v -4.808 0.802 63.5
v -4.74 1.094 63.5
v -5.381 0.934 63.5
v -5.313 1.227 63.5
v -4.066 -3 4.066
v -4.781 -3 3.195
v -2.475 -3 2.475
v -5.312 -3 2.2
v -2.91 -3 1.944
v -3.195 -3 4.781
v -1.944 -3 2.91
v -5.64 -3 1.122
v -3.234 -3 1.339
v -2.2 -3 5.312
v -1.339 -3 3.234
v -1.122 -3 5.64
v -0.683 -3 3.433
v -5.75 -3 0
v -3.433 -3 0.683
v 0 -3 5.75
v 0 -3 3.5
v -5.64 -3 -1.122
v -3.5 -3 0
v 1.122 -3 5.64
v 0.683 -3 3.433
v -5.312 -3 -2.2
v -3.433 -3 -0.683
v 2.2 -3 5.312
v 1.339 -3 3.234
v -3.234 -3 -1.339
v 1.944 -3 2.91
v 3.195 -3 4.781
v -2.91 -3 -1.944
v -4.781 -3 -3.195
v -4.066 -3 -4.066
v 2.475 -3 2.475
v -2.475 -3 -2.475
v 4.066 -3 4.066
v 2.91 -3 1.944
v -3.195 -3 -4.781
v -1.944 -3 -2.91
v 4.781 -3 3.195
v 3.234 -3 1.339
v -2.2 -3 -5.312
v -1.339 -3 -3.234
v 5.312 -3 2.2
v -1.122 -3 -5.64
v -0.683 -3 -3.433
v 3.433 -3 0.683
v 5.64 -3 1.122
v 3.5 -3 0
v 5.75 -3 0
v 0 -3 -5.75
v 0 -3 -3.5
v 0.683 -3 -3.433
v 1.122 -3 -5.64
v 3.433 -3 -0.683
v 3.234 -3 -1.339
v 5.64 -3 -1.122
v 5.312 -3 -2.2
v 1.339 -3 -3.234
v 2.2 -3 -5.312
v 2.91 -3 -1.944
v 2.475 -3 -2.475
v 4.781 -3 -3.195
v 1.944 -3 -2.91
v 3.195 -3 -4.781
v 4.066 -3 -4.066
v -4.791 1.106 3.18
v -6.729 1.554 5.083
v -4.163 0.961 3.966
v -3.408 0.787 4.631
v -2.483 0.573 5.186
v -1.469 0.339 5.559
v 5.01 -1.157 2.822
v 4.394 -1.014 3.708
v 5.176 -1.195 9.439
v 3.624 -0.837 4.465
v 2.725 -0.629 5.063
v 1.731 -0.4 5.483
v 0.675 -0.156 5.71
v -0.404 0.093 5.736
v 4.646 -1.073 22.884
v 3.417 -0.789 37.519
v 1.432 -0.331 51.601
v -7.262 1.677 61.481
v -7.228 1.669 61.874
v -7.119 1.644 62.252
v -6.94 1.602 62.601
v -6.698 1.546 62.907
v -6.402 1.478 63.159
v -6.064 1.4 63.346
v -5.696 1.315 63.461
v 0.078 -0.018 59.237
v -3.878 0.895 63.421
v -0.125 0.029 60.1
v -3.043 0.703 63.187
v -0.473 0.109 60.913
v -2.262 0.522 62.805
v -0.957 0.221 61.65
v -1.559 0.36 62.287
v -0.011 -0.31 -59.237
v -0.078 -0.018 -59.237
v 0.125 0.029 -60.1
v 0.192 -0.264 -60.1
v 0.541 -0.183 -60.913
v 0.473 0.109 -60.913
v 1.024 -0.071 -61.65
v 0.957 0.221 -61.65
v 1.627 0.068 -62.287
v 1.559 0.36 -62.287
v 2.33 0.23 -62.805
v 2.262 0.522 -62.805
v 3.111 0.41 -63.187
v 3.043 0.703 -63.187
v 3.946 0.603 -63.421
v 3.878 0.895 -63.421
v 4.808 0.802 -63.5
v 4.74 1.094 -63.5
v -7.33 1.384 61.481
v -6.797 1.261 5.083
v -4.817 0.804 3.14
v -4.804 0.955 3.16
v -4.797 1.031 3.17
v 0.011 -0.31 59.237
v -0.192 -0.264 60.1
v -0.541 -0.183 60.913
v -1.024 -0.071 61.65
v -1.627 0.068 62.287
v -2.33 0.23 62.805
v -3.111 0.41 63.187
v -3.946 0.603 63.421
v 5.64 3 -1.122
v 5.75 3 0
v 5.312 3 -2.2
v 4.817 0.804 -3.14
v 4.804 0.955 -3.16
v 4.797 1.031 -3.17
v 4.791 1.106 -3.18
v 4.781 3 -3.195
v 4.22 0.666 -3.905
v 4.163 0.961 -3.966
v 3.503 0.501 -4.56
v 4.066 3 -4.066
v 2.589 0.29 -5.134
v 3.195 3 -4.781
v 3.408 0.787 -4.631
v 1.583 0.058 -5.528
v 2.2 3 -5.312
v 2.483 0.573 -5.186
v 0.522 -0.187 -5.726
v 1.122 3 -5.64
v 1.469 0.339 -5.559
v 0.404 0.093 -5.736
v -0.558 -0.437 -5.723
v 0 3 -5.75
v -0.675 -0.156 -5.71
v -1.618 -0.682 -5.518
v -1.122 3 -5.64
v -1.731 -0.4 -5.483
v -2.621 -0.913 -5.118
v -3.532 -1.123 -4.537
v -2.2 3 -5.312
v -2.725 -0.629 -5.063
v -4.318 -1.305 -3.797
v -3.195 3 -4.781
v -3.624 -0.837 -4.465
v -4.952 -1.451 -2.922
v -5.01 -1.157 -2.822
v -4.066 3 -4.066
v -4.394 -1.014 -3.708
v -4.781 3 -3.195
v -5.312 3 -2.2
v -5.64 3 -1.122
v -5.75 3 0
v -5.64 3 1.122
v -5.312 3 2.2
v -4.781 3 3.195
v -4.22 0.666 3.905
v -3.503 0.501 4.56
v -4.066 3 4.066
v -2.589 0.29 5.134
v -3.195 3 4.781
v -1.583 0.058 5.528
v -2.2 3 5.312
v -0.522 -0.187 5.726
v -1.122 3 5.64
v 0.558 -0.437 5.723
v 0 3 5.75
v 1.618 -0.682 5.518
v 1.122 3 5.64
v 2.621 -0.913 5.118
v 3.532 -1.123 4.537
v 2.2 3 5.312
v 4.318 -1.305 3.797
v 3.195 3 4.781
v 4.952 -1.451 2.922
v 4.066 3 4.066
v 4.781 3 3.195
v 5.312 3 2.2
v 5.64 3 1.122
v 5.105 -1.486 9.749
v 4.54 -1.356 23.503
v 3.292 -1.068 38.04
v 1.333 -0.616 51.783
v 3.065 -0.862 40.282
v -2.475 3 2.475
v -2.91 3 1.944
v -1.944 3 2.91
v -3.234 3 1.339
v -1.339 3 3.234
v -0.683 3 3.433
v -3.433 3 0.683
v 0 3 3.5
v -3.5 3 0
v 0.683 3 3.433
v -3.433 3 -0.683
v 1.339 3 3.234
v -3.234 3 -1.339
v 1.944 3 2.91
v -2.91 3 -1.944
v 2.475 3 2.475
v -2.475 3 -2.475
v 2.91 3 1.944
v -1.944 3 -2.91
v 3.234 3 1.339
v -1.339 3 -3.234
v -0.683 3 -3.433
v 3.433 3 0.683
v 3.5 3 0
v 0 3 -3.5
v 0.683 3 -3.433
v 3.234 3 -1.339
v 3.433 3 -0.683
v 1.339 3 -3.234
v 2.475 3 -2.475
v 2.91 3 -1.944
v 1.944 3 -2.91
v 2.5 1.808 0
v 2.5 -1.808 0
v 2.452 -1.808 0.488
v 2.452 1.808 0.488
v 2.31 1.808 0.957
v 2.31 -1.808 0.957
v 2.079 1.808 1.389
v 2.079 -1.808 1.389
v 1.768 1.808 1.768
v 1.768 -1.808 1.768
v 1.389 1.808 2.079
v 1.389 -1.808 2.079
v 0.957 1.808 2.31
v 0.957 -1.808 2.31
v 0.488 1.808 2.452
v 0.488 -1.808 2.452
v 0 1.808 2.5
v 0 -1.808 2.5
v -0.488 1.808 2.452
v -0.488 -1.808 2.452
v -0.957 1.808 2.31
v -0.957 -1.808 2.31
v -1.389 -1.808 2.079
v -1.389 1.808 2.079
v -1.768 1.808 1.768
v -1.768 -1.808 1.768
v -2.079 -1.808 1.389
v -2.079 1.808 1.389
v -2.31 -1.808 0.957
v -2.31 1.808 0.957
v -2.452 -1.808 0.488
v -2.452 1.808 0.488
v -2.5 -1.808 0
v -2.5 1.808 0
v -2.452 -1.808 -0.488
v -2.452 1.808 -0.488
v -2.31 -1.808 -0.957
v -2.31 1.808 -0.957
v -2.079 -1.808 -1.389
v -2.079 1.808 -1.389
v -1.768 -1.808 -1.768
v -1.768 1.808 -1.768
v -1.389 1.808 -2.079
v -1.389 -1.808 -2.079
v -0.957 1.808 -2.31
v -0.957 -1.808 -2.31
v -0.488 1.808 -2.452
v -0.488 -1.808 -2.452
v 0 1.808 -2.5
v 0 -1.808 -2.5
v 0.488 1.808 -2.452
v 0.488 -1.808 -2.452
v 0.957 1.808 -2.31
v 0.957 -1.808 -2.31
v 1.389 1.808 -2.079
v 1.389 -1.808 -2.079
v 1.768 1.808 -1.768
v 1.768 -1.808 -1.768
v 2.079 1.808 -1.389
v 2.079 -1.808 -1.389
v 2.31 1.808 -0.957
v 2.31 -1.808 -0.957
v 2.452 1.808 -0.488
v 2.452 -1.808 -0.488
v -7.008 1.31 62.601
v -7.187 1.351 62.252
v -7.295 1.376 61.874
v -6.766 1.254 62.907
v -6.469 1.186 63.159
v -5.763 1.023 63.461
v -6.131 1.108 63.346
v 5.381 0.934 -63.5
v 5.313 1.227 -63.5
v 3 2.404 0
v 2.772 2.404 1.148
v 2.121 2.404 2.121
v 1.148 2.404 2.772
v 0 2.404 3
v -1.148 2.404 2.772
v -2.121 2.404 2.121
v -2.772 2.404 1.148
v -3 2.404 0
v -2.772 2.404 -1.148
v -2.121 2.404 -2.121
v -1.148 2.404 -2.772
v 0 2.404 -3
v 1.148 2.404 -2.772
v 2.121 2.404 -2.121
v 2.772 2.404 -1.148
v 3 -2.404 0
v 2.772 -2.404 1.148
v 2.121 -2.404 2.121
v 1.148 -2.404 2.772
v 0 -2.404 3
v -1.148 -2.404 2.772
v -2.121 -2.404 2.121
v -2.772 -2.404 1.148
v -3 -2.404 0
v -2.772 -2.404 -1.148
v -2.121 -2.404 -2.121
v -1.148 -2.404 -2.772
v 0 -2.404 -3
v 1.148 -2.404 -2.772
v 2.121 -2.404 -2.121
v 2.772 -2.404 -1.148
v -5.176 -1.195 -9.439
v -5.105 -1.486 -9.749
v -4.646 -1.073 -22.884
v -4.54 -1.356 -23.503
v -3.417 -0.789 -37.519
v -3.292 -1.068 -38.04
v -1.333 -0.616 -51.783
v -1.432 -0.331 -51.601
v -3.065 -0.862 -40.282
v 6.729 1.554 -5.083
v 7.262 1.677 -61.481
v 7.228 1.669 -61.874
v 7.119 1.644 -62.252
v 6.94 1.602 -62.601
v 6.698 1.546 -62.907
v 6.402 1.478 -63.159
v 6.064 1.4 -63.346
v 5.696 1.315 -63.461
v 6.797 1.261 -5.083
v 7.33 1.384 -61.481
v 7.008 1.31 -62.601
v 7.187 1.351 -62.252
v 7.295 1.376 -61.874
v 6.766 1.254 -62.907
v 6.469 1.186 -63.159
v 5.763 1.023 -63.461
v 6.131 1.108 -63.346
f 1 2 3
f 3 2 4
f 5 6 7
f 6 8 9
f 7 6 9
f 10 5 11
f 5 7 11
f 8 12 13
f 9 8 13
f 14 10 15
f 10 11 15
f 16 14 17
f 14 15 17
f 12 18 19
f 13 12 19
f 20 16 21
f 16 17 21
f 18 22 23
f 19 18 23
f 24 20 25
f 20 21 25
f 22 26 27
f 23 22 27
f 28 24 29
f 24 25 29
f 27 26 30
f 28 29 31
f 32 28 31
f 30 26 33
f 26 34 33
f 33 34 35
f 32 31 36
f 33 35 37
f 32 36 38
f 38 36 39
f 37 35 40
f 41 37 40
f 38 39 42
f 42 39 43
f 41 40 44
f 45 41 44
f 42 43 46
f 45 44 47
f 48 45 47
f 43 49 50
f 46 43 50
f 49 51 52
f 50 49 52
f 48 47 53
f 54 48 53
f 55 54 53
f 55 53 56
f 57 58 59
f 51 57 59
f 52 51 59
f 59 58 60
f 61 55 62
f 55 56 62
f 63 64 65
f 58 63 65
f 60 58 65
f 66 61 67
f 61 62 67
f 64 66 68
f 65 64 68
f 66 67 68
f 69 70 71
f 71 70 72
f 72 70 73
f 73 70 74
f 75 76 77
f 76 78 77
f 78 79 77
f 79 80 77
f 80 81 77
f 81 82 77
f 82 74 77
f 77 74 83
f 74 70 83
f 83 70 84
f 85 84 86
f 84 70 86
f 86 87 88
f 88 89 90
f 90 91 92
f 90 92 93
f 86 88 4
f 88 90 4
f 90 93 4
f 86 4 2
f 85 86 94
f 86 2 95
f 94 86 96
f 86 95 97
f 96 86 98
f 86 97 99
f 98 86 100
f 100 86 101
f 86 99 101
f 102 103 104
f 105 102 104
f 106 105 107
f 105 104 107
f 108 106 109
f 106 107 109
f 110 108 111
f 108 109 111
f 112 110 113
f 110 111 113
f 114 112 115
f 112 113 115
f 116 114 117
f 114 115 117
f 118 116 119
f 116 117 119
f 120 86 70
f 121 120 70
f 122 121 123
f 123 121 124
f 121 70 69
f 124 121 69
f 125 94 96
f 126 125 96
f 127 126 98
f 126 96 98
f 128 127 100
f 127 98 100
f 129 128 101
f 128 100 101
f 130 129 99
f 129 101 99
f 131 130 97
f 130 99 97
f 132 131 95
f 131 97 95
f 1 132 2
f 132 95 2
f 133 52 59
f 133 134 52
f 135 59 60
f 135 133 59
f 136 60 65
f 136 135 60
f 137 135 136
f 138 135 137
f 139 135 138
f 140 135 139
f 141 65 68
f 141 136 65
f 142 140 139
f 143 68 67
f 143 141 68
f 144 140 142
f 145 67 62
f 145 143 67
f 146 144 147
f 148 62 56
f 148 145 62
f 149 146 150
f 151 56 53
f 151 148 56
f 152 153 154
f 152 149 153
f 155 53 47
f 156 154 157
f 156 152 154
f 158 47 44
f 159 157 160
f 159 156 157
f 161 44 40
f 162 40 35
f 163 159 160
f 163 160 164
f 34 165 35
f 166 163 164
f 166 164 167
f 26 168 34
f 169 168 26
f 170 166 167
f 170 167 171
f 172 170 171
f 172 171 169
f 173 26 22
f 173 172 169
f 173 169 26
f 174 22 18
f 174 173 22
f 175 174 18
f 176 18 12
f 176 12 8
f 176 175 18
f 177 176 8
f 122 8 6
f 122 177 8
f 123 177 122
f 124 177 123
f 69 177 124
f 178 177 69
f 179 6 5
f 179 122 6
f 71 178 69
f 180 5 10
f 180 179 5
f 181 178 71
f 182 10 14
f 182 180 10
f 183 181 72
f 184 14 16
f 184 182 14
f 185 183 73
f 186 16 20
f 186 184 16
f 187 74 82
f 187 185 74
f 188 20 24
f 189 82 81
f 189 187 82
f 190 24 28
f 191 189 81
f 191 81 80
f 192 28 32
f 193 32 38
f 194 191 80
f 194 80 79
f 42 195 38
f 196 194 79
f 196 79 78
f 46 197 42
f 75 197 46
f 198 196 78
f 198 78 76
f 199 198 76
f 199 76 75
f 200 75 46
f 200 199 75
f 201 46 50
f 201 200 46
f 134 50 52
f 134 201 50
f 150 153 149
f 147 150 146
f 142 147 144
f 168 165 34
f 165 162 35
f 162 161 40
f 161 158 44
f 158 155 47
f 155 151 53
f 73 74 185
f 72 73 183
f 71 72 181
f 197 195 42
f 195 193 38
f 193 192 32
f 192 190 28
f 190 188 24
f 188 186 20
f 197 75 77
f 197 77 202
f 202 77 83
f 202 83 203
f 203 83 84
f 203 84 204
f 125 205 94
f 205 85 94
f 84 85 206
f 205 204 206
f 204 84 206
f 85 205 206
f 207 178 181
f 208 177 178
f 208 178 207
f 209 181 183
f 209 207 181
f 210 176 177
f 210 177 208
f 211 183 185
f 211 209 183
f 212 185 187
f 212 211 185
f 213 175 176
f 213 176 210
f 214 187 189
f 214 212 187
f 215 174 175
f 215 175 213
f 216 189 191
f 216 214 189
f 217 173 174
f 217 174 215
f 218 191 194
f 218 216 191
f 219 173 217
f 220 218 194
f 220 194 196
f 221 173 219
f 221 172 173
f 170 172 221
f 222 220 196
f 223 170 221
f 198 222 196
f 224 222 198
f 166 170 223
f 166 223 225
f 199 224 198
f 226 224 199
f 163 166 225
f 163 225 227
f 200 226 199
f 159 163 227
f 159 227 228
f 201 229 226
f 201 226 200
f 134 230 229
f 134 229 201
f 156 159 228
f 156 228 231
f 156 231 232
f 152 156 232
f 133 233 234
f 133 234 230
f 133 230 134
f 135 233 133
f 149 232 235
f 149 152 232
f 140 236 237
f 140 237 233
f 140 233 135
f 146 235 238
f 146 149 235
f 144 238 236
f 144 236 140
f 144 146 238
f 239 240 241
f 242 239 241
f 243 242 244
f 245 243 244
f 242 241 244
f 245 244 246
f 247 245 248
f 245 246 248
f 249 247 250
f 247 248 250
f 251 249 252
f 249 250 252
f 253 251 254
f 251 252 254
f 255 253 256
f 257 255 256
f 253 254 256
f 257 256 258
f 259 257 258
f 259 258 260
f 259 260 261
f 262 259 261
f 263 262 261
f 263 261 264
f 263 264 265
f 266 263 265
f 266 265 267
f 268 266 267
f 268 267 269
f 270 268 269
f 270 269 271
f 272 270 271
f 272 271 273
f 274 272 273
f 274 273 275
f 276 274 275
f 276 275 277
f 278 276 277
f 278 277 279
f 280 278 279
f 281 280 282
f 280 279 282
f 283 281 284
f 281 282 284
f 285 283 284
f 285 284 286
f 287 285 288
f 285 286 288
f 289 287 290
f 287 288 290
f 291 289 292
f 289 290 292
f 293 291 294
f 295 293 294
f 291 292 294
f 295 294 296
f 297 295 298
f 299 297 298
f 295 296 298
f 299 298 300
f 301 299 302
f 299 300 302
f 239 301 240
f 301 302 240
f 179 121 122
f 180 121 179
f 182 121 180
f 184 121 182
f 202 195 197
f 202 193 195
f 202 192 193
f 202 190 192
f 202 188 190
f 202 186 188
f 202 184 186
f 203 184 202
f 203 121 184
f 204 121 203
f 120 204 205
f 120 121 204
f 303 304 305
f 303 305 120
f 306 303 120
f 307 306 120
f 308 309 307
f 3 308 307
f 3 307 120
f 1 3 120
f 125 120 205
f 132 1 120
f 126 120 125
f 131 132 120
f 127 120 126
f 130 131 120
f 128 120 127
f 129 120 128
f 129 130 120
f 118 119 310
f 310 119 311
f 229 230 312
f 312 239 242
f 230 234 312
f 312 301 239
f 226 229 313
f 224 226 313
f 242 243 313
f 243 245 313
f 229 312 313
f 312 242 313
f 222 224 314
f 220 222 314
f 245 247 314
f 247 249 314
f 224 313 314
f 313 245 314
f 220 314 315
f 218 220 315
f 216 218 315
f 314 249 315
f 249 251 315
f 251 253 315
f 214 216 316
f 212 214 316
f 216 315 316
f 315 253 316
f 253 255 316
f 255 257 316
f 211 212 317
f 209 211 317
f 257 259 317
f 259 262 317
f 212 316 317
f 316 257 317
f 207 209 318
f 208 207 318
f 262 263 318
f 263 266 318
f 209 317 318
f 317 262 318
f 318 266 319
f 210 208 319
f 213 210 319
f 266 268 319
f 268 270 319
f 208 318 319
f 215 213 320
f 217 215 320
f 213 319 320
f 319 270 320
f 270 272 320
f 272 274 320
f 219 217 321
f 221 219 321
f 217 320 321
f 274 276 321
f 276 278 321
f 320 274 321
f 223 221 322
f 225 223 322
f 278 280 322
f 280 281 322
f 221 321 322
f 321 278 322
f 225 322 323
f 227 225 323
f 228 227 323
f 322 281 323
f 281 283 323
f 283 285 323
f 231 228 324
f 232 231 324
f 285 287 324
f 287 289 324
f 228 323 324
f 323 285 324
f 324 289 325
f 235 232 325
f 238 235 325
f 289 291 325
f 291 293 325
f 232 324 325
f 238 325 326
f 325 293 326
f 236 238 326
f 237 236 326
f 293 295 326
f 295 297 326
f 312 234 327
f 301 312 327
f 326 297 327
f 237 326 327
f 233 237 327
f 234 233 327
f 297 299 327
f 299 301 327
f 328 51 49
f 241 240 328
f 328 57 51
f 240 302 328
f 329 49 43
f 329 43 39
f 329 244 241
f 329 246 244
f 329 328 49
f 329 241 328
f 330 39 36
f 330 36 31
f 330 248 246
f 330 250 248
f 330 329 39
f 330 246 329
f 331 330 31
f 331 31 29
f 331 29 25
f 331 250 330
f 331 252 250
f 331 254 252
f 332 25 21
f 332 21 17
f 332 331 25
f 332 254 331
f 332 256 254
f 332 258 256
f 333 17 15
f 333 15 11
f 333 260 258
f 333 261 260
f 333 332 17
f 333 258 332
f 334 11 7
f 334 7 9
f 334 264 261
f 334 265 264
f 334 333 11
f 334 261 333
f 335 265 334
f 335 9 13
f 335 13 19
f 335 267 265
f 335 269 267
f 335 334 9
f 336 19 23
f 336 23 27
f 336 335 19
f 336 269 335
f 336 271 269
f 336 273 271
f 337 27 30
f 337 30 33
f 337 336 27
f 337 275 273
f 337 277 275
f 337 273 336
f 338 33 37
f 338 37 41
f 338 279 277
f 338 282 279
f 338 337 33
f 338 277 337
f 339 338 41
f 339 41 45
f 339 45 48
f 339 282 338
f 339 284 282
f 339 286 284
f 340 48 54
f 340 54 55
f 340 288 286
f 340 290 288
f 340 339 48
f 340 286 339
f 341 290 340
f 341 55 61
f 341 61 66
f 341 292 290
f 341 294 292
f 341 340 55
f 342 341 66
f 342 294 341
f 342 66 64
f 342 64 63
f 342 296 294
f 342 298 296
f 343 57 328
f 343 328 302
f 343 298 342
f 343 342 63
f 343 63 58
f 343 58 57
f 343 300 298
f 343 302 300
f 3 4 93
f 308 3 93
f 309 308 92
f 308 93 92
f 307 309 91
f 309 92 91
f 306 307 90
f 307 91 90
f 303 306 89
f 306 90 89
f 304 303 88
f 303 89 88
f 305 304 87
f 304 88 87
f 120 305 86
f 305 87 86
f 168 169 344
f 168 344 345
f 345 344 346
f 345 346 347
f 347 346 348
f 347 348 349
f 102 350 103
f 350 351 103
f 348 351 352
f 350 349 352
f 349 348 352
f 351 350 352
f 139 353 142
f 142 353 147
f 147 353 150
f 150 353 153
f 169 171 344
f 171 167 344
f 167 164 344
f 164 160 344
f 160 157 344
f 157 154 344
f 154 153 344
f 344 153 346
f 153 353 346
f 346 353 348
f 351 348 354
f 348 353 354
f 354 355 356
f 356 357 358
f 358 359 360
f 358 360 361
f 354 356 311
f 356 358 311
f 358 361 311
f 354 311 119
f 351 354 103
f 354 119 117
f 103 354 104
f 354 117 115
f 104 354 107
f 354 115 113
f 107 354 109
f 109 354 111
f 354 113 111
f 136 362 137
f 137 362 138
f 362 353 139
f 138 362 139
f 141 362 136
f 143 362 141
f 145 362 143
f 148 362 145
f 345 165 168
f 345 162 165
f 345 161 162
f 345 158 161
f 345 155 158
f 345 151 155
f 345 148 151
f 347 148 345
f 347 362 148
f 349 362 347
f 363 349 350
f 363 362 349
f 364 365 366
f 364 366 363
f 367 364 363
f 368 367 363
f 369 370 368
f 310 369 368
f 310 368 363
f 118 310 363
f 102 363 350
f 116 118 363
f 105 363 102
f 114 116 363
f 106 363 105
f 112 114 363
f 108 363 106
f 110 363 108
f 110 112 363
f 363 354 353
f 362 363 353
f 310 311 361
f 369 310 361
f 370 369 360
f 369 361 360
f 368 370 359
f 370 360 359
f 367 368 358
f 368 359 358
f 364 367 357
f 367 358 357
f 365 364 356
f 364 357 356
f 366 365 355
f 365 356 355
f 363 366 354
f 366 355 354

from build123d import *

# Parameters (mm, degrees)
SKETCH1_R             = 5.75
BOSS_EXTRUDE1_DEPTH   = 3
BOSS_EXTRUDE2_DEPTH   = 0.3
CIRPATTERN1_COUNT     = 2
SKETCH4_R             = 2.5
CUT_EXTRUDE1_DEPTH    = 16.3
CHAMFER1_SIZE         = 1
CHAMFER1_SIZE2        = 1.191753593
CHAMFER1_PART_2_SIZE  = 1
CHAMFER1_PART_2_SIZE2 = 1.191753593


with BuildPart() as part:
    # Sketch1 → Boss-Extrude1 (new body, symmetric)
    with BuildSketch(Plane(origin=(0, 0, 0), x_dir=(1, 0, 0), z_dir=(0, 1, 0))):
        Circle(SKETCH1_R)
    extrude(amount=BOSS_EXTRUDE1_DEPTH, both=True)

    # Sketch3 → Boss-Extrude2 (add)
    with BuildSketch(Plane(origin=(0, 0, 0), x_dir=(0.974370065, -0.224951054, 0), z_dir=(-0.224951054, -0.974370065, 0))):
        with BuildLine():
            Line((-6.906213286, 5.083465827), (-4.318560917, 2.607550724))
            Line((-4.318560917, 2.607550724), (5.113121785, 2.549410262))
            add(Edge.make_bspline(
                [(5.113121785, 2.549410262), (5.735638165, 8.028953924), (4.346346729, 38.97674066), (0.38313372, 57.205124306), (0.080525316, 59.236652626)],
                knots=[0, 0, 0, 0, 0.55249972, 0.930981027, 0.930981027, 0.930981027, 0.930981027], degree=3))
            ThreePointArc((0.080525316, 59.236652626), (-1.600195584, 62.287034666), (-4.864911258, 63.5))
            Line((-4.864911258, 63.5), (-5.4532168, 63.5))
            ThreePointArc((-5.4532168, 63.5), (-6.874270643, 62.907340035), (-7.453122766, 61.480605975))
            Line((-7.453122766, 61.480605975), (-6.906213286, 5.083465827))
        make_face()
    boss_extrude2 = extrude(amount=BOSS_EXTRUDE2_DEPTH)

    # CirPattern1: Boss-Extrude2 ×2 about axis
    cirpattern1_axis = Axis((0, -3, 0), (0, 1, 0))
    for i in range(1, CIRPATTERN1_COUNT):
        add(boss_extrude2.rotate(cirpattern1_axis, i * 360 / CIRPATTERN1_COUNT))

    # Sketch4 → Cut-Extrude1 (cut)
    with BuildSketch(Plane.XZ.offset(3)):
        Circle(SKETCH4_R)
    extrude(amount=-CUT_EXTRUDE1_DEPTH, mode=Mode.SUBTRACT)

    # Chamfer1
    chamfer1_edges = [part.edges().sort_by_distance(p)[0] for p in [
        (-2.5, 3, 0),
    ]]
    chamfer1_side = [part.faces().sort_by_distance(p)[0] for p in [
        (-5.58736544, 3, 0),
    ]]
    chamfer(chamfer1_edges, length=CHAMFER1_SIZE, length2=CHAMFER1_SIZE2, reference=chamfer1_side[0])

    # Chamfer1 part 2
    chamfer1_part_2_edges = [part.edges().sort_by_distance(p)[0] for p in [
        (-2.5, -3, 0),
    ]]
    chamfer1_part_2_side = [part.faces().sort_by_distance(p)[0] for p in [
        (-5.58736544, -3, 0),
    ]]
    chamfer(chamfer1_part_2_edges, length=CHAMFER1_PART_2_SIZE, length2=CHAMFER1_PART_2_SIZE2, reference=chamfer1_part_2_side[0])


solid = part.part
